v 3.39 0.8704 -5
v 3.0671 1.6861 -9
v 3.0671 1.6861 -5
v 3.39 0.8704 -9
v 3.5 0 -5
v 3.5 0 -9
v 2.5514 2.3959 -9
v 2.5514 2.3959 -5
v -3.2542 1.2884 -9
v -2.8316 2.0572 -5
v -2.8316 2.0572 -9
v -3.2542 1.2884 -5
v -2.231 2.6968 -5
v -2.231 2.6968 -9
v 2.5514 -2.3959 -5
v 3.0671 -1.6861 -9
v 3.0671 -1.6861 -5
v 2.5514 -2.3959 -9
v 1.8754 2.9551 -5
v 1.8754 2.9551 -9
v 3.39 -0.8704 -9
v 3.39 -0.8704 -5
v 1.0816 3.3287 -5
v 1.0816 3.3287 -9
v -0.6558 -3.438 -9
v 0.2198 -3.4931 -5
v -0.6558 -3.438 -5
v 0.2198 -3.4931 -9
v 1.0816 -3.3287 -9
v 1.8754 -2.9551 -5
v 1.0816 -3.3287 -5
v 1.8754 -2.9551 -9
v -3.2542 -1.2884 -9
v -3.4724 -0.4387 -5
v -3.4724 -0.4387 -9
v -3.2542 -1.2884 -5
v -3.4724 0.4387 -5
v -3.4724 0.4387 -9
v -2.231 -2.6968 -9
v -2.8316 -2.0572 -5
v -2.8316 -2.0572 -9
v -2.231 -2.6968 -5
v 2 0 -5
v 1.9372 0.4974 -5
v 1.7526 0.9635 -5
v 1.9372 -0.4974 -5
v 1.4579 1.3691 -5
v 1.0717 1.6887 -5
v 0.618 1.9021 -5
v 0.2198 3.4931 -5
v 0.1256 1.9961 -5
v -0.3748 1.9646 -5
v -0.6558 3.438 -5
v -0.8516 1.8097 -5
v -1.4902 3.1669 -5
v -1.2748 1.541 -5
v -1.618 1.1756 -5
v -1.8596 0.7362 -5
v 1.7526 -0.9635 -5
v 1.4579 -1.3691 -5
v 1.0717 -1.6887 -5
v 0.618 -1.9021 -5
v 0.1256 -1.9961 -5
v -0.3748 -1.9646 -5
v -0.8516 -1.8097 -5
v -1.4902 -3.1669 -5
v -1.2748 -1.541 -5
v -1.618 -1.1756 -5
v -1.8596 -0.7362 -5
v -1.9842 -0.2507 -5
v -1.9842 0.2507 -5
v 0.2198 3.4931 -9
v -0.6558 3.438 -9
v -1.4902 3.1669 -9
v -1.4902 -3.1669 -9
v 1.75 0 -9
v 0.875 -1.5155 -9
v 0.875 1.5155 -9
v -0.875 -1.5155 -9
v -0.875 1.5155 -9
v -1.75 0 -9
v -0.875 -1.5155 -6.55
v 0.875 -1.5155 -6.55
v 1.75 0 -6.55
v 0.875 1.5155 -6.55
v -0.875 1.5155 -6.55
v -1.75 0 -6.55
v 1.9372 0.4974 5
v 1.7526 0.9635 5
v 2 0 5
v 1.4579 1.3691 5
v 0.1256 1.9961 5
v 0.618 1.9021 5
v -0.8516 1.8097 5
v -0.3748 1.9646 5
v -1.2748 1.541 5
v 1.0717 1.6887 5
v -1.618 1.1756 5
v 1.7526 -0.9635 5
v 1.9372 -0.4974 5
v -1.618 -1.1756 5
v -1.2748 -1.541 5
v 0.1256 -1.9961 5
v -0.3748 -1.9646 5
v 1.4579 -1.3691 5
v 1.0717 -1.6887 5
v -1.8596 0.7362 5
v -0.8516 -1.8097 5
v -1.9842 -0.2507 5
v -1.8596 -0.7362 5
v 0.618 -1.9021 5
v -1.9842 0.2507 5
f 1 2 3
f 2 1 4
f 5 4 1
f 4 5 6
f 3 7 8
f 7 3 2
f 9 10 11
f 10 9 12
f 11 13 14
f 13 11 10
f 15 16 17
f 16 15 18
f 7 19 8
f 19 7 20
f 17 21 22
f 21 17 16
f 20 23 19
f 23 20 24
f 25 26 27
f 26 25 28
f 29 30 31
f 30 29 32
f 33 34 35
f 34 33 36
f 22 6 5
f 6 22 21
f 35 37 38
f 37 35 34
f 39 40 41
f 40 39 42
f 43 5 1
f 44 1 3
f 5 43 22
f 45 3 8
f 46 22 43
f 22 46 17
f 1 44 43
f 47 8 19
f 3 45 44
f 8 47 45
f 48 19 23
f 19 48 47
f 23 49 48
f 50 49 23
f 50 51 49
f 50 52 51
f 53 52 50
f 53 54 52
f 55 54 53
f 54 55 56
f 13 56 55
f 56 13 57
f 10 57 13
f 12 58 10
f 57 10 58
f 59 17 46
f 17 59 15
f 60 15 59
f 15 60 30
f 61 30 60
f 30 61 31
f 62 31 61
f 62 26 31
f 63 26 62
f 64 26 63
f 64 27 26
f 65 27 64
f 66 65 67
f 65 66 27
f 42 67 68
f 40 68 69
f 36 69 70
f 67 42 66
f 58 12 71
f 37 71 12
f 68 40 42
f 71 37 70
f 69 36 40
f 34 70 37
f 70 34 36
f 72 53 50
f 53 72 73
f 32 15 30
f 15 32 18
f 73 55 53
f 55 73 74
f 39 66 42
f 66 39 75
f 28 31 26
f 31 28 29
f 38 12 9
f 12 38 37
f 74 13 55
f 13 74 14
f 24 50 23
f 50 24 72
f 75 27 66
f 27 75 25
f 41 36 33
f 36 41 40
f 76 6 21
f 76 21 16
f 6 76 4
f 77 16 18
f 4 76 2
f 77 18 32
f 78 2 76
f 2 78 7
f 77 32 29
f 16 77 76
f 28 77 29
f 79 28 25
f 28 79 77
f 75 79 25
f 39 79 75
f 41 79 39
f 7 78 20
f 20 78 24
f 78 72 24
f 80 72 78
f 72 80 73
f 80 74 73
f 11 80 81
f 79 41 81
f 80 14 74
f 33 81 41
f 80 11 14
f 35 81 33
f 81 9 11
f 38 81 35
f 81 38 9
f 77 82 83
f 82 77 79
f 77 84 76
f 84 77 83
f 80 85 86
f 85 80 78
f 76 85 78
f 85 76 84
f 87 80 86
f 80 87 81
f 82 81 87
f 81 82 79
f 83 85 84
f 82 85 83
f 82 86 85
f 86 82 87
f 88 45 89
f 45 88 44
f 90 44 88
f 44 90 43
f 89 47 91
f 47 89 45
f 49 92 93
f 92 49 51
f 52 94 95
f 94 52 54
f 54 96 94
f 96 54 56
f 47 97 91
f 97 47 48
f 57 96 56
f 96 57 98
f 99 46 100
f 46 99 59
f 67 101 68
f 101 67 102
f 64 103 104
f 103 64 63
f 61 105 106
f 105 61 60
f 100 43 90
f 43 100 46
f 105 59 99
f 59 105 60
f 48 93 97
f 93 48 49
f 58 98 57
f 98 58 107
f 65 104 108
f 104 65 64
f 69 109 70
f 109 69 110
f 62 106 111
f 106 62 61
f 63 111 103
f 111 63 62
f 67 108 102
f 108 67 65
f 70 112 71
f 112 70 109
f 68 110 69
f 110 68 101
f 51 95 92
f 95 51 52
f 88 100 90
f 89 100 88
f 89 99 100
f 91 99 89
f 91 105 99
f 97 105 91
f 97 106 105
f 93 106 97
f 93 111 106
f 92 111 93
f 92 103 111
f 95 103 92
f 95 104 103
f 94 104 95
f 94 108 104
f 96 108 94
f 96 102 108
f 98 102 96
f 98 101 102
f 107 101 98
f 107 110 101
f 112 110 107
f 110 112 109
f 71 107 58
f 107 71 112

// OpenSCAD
// file: lib/screw_nuts.scad
$fn=25;

module screw_m3(h=20, button=false){
    cylinder(d=3, h=h, center=true);
    translate([0, 0, -h/2-1.5])
        difference(){
            cylinder(d=5.5, h=3, center=true);
            translate([0, 0, -0.8])
                cylinder(d=2.8, h=1.8, $fn=6, center=true);
        }
}

module screw_m4(h=20, button=false){
    cylinder(d=4, h=h, center=true);
    translate([0, 0, -h/2-2])
        difference(){
            if (button) {
                translate([0, 0, 2])
                    scale([1, 1, 6/7.5])
                    sphere(d=7.5);
            } else {
                cylinder(d=7, h=4, center=true);
            }
            if (button) {
                 translate([0, 0, 5])
                    cube([7.6, 7.6, 6], center=true);
            }
            translate([0, 0, -0.8])
                cylinder(d=3.5, h=2.5, $fn=6, center=true);
        }
}

module nut_m3(){
    difference(){
        cylinder(d=6, h=2.4, $fn=6);
        translate([0, 0, -0.05])
            cylinder(d=3, h=2.5);
    }
}

module nut_m4(){
    difference(){
        cylinder(d=7.6, h=3.2, $fn=6);
        translate([0, 0, -0.05])
            cylinder(d=4, h=3.3);
    }
}

module washer_m3(h){
    difference(){
        cylinder(d=8, h=h, center=true);
        cylinder(d=3.4, h=h+0.1, center=true);
    }
}

module washer_m5(h){
    difference(){
        cylinder(d=8, h=h, center=true);
        cylinder(d=5.4, h=h+0.1, center=true);
    }
}
// main file
// NAME: Screw M4x10
// COLOR: 80
// CATEGORY: Support

include <lib/screw_nuts.scad>

color("silver")
    screw_m4(10);
